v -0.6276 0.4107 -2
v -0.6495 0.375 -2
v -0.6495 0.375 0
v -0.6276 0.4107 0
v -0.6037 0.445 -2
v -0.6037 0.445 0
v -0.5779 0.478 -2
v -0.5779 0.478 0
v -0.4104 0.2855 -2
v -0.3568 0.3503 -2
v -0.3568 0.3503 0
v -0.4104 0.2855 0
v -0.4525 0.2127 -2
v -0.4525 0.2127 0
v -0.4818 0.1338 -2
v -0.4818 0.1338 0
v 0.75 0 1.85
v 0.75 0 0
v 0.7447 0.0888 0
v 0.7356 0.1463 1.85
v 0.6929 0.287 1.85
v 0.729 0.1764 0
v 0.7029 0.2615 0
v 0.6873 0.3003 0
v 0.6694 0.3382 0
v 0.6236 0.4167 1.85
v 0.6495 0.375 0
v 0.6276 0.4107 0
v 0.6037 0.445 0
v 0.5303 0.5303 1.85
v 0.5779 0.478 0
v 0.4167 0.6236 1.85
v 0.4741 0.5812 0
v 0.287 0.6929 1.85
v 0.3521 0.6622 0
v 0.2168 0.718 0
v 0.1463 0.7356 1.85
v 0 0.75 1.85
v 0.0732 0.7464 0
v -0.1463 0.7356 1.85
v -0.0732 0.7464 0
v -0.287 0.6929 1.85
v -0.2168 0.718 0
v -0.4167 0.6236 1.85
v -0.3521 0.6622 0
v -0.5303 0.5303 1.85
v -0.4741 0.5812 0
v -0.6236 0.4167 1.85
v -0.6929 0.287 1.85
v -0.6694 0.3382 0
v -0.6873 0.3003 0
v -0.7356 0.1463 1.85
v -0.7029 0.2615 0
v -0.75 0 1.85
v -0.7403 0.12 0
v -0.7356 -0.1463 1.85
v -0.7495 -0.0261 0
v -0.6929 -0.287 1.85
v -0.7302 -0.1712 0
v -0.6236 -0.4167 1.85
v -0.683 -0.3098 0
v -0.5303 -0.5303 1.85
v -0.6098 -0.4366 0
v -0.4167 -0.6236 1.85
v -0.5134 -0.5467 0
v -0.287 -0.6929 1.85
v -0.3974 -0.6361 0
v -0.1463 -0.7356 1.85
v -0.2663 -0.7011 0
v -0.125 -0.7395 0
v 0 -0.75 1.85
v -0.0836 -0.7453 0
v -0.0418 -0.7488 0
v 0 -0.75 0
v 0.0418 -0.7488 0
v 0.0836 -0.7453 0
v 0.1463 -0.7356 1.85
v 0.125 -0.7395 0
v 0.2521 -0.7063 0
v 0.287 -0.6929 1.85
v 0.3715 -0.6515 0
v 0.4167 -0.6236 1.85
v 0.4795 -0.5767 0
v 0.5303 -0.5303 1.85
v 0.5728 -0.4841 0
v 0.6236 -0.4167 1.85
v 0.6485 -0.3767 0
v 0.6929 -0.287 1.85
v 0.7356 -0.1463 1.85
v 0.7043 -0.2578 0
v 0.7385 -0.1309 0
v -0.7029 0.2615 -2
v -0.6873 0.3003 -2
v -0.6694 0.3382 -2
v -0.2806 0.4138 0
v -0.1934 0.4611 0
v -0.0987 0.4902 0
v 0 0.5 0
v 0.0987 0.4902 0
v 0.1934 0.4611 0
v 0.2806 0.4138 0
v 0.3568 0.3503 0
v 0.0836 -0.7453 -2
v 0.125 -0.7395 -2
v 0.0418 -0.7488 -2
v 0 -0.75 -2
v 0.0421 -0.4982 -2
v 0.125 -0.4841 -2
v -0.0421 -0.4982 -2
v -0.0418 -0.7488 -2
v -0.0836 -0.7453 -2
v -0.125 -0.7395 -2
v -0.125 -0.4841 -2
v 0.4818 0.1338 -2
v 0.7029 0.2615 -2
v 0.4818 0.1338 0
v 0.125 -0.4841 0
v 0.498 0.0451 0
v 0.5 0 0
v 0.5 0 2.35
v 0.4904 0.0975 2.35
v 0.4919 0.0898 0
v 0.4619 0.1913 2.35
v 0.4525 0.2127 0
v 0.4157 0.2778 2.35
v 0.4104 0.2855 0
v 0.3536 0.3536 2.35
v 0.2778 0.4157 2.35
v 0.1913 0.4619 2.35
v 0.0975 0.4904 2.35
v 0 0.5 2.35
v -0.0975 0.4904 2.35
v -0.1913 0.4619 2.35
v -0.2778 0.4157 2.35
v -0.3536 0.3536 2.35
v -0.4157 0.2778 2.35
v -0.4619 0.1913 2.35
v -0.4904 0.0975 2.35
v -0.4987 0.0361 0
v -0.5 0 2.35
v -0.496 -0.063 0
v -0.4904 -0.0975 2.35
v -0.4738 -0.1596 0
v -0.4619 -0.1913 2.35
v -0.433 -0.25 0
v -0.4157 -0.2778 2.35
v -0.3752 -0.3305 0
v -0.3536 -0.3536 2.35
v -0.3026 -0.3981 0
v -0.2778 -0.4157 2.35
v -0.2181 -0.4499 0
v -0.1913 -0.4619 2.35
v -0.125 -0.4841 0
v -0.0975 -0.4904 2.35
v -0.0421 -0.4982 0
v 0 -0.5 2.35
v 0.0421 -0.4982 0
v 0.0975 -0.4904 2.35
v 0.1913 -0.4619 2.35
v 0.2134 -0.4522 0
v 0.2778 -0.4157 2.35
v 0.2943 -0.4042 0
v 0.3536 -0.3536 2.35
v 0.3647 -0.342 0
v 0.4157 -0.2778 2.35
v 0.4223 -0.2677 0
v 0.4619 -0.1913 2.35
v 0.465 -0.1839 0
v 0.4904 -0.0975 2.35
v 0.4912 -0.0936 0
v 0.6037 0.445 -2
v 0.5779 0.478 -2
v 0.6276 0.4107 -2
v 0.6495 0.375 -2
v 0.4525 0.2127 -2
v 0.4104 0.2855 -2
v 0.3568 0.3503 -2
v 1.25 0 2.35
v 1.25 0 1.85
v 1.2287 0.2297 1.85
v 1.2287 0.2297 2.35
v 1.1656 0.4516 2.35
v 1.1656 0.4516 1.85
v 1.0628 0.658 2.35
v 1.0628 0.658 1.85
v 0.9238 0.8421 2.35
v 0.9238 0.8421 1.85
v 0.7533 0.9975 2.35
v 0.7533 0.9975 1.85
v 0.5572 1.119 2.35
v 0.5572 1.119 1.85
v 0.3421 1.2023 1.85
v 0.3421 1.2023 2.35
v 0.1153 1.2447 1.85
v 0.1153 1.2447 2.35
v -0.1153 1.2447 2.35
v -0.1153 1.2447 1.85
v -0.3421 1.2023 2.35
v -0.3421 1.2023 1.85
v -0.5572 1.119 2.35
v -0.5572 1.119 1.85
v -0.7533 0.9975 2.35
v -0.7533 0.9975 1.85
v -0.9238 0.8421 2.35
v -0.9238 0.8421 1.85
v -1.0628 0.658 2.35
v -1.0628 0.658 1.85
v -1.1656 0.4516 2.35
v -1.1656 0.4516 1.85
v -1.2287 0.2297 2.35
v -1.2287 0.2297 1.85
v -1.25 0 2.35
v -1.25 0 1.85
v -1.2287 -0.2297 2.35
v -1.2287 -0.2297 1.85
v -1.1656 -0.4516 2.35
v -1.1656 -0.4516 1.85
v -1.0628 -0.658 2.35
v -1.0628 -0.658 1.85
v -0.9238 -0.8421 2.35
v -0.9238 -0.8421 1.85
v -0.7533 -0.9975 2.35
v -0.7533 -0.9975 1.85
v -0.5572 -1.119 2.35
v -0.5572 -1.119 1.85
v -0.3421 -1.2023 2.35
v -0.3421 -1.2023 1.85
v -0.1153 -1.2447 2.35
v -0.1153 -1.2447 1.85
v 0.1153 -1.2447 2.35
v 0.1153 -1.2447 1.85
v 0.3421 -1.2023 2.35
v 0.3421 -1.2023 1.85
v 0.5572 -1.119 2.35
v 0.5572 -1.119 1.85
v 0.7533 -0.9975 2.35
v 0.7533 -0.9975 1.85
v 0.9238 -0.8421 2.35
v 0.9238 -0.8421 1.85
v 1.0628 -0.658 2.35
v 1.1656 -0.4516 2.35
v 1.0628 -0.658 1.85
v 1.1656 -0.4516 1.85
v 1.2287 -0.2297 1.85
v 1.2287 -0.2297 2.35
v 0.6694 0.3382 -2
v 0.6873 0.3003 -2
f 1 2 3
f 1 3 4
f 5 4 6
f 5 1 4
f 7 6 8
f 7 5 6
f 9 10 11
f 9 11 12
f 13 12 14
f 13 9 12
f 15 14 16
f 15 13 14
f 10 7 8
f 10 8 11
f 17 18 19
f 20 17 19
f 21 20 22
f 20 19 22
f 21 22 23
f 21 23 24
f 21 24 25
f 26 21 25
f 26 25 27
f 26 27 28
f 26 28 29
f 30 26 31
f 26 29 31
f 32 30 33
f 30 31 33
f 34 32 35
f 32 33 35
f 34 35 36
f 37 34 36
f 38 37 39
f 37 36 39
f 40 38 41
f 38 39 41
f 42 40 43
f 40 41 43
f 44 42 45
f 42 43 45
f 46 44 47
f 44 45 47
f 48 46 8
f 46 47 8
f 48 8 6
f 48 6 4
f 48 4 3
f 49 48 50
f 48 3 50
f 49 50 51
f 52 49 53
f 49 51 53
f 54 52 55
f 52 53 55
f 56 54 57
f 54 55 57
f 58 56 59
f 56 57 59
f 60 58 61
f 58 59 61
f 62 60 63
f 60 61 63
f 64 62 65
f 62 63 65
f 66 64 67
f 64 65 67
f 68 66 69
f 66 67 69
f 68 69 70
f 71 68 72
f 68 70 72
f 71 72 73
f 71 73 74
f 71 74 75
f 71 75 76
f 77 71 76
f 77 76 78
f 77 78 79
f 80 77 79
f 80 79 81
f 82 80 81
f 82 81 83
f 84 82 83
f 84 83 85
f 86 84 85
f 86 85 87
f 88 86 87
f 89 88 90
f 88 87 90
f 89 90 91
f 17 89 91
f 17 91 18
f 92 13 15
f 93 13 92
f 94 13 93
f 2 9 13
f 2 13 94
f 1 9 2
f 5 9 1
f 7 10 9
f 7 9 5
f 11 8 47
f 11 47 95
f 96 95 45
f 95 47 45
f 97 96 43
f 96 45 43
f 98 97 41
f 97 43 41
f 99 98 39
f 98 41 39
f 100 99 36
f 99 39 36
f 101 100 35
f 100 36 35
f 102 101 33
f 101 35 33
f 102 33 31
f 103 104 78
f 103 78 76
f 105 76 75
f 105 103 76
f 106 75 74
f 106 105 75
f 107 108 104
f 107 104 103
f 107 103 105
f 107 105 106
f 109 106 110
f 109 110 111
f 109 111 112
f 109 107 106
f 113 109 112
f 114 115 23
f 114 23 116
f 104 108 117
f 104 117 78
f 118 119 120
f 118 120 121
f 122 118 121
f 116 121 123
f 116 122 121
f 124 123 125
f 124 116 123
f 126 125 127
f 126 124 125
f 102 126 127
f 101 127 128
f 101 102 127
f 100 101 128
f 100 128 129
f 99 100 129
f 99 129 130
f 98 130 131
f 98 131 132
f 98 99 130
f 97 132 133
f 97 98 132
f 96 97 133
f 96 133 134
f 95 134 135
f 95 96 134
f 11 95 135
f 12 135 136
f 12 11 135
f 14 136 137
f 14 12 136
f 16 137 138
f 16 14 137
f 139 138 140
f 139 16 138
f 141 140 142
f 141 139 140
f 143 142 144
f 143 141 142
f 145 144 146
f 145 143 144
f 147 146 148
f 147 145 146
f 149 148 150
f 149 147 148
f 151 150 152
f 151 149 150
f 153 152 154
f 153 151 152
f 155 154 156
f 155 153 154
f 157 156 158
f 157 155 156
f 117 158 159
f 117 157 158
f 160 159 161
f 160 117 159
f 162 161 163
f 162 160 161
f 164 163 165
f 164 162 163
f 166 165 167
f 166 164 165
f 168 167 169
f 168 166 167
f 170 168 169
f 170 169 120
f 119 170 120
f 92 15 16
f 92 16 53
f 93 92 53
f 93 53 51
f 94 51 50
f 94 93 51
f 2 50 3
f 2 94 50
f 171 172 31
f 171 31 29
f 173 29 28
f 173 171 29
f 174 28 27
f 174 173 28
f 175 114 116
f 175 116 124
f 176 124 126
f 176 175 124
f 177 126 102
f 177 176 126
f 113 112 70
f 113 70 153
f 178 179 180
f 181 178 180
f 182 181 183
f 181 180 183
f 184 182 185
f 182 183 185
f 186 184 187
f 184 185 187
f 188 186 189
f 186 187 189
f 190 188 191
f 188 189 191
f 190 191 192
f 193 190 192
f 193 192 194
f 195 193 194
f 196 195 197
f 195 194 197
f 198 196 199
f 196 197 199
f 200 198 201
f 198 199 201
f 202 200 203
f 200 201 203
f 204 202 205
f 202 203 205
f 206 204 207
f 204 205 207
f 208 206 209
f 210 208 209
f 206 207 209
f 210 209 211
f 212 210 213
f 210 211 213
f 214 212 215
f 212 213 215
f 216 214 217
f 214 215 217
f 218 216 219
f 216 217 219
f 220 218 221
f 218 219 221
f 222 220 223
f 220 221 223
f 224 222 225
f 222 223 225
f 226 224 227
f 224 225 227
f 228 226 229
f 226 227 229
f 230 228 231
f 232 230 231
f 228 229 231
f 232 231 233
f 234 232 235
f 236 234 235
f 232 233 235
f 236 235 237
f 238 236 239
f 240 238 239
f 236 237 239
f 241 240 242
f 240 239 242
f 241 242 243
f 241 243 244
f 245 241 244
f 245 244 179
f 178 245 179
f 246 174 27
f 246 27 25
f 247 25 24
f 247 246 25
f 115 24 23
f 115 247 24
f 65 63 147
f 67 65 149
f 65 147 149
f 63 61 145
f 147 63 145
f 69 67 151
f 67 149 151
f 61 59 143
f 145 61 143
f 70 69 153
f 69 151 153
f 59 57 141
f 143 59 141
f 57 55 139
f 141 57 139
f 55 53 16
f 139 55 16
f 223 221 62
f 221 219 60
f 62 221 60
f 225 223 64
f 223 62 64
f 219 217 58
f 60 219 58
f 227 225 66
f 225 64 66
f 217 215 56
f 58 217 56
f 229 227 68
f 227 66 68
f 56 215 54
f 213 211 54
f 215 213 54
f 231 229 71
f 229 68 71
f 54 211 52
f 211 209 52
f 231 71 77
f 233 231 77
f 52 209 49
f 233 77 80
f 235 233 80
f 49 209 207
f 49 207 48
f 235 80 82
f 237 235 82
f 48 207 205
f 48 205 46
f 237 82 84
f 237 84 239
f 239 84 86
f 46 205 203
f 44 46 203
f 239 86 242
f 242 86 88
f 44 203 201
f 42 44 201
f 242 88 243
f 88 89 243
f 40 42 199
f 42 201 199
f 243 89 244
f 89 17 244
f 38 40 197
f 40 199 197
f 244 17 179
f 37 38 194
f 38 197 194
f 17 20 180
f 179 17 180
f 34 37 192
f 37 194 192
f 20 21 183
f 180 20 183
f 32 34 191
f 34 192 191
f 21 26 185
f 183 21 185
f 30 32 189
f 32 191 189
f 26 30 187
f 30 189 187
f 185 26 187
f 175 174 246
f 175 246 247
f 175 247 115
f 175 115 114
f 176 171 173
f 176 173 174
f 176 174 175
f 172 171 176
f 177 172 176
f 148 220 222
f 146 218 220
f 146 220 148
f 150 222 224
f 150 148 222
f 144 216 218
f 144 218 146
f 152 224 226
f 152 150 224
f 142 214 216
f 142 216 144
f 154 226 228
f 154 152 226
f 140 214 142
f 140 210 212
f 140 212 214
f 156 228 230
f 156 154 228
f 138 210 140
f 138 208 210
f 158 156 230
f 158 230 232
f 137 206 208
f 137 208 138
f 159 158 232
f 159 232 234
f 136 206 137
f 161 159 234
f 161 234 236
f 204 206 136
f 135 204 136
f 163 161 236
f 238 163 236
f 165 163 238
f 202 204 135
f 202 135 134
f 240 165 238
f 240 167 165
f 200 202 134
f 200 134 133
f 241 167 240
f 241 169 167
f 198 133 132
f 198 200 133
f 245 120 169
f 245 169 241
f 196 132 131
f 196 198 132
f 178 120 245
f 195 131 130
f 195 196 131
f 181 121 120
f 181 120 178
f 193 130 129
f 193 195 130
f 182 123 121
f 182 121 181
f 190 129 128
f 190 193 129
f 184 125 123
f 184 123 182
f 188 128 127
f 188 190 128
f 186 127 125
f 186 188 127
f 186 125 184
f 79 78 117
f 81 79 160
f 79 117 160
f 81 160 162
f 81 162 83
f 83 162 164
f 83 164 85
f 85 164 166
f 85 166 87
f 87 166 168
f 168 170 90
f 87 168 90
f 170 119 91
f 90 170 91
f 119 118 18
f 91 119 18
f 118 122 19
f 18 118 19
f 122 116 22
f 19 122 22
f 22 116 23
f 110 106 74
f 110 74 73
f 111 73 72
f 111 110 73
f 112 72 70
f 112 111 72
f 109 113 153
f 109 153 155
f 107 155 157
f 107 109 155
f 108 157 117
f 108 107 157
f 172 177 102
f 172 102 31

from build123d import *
from build123d.topology import SkipClean

# Parameters (mm, degrees)
SKETCH1_R           = 0.75
SKETCH1_R_2         = 0.5
BOSS_EXTRUDE1_DEPTH = 1.85
SKETCH2_R           = 1.25
SKETCH2_R_2         = 0.5
BOSS_EXTRUDE2_DEPTH = 0.5
BOSS_EXTRUDE3_START = 2
BOSS_EXTRUDE3_DEPTH = 2


with BuildPart() as part:
    # Sketch1 → Boss-Extrude1 (new body)
    with BuildSketch(Plane.XY):
        Circle(SKETCH1_R)
        Circle(SKETCH1_R_2, mode=Mode.SUBTRACT)
    extrude(amount=BOSS_EXTRUDE1_DEPTH)

    # Sketch2 → Boss-Extrude2 (add)
    with BuildSketch(Plane.XY.offset(1.85)):
        Circle(SKETCH2_R)
        Circle(SKETCH2_R_2, mode=Mode.SUBTRACT)
    extrude(amount=BOSS_EXTRUDE2_DEPTH)

    # Sketch4 → Boss-Extrude3 (add)
    with SkipClean():  # the faces are left unmerged after this step: merging them gives an invalid solid
        with BuildSketch(Plane(origin=(0, 0, 0), x_dir=(-1, 0, 0), z_dir=(0, 0, -1)).offset(BOSS_EXTRUDE3_START)):
            with BuildLine():
                Line((-0.356762746, 0.350314635), (-0.577934423, 0.478008162))
                ThreePointArc((-0.577934423, 0.478008162), (-0.615884067, 0.42800329), (-0.649519059, 0.374999989))
                ThreePointArc((-0.649519059, 0.374999989), (-0.678603761, 0.319369591), (-0.702934423, 0.261501811))
                Line((-0.702934423, 0.261501811), (-0.481762746, 0.133808284))
                ThreePointArc((-0.481762746, 0.133808284), (-0.433012702, 0.25), (-0.356762746, 0.350314635))
            make_face()
            with BuildLine():
                ThreePointArc((0.702934423, 0.261501811), (0.678603761, 0.319369591), (0.649519059, 0.374999989))
                ThreePointArc((0.649519059, 0.374999989), (0.615884067, 0.42800329), (0.577934423, 0.478008162))
                Line((0.577934423, 0.478008162), (0.356762746, 0.350314635))
                ThreePointArc((0.356762746, 0.350314635), (0.433012702, 0.25), (0.481762746, 0.133808284))
                Line((0.481762746, 0.133808284), (0.702934423, 0.261501811))
            make_face()
            with BuildLine():
                ThreePointArc((0, -0.75), (0.062719695, -0.747372892), (0.125, -0.739509973))
                Line((0.125, -0.739509973), (0.125, -0.484122918))
                ThreePointArc((0.125, -0.484122918), (0, -0.5), (-0.125, -0.484122918))
                Line((-0.125, -0.484122918), (-0.125, -0.739509973))
                ThreePointArc((-0.125, -0.739509973), (-0.062719695, -0.747372892), (0, -0.75))
            make_face()
        extrude(amount=-BOSS_EXTRUDE3_DEPTH)


solid = part.part
